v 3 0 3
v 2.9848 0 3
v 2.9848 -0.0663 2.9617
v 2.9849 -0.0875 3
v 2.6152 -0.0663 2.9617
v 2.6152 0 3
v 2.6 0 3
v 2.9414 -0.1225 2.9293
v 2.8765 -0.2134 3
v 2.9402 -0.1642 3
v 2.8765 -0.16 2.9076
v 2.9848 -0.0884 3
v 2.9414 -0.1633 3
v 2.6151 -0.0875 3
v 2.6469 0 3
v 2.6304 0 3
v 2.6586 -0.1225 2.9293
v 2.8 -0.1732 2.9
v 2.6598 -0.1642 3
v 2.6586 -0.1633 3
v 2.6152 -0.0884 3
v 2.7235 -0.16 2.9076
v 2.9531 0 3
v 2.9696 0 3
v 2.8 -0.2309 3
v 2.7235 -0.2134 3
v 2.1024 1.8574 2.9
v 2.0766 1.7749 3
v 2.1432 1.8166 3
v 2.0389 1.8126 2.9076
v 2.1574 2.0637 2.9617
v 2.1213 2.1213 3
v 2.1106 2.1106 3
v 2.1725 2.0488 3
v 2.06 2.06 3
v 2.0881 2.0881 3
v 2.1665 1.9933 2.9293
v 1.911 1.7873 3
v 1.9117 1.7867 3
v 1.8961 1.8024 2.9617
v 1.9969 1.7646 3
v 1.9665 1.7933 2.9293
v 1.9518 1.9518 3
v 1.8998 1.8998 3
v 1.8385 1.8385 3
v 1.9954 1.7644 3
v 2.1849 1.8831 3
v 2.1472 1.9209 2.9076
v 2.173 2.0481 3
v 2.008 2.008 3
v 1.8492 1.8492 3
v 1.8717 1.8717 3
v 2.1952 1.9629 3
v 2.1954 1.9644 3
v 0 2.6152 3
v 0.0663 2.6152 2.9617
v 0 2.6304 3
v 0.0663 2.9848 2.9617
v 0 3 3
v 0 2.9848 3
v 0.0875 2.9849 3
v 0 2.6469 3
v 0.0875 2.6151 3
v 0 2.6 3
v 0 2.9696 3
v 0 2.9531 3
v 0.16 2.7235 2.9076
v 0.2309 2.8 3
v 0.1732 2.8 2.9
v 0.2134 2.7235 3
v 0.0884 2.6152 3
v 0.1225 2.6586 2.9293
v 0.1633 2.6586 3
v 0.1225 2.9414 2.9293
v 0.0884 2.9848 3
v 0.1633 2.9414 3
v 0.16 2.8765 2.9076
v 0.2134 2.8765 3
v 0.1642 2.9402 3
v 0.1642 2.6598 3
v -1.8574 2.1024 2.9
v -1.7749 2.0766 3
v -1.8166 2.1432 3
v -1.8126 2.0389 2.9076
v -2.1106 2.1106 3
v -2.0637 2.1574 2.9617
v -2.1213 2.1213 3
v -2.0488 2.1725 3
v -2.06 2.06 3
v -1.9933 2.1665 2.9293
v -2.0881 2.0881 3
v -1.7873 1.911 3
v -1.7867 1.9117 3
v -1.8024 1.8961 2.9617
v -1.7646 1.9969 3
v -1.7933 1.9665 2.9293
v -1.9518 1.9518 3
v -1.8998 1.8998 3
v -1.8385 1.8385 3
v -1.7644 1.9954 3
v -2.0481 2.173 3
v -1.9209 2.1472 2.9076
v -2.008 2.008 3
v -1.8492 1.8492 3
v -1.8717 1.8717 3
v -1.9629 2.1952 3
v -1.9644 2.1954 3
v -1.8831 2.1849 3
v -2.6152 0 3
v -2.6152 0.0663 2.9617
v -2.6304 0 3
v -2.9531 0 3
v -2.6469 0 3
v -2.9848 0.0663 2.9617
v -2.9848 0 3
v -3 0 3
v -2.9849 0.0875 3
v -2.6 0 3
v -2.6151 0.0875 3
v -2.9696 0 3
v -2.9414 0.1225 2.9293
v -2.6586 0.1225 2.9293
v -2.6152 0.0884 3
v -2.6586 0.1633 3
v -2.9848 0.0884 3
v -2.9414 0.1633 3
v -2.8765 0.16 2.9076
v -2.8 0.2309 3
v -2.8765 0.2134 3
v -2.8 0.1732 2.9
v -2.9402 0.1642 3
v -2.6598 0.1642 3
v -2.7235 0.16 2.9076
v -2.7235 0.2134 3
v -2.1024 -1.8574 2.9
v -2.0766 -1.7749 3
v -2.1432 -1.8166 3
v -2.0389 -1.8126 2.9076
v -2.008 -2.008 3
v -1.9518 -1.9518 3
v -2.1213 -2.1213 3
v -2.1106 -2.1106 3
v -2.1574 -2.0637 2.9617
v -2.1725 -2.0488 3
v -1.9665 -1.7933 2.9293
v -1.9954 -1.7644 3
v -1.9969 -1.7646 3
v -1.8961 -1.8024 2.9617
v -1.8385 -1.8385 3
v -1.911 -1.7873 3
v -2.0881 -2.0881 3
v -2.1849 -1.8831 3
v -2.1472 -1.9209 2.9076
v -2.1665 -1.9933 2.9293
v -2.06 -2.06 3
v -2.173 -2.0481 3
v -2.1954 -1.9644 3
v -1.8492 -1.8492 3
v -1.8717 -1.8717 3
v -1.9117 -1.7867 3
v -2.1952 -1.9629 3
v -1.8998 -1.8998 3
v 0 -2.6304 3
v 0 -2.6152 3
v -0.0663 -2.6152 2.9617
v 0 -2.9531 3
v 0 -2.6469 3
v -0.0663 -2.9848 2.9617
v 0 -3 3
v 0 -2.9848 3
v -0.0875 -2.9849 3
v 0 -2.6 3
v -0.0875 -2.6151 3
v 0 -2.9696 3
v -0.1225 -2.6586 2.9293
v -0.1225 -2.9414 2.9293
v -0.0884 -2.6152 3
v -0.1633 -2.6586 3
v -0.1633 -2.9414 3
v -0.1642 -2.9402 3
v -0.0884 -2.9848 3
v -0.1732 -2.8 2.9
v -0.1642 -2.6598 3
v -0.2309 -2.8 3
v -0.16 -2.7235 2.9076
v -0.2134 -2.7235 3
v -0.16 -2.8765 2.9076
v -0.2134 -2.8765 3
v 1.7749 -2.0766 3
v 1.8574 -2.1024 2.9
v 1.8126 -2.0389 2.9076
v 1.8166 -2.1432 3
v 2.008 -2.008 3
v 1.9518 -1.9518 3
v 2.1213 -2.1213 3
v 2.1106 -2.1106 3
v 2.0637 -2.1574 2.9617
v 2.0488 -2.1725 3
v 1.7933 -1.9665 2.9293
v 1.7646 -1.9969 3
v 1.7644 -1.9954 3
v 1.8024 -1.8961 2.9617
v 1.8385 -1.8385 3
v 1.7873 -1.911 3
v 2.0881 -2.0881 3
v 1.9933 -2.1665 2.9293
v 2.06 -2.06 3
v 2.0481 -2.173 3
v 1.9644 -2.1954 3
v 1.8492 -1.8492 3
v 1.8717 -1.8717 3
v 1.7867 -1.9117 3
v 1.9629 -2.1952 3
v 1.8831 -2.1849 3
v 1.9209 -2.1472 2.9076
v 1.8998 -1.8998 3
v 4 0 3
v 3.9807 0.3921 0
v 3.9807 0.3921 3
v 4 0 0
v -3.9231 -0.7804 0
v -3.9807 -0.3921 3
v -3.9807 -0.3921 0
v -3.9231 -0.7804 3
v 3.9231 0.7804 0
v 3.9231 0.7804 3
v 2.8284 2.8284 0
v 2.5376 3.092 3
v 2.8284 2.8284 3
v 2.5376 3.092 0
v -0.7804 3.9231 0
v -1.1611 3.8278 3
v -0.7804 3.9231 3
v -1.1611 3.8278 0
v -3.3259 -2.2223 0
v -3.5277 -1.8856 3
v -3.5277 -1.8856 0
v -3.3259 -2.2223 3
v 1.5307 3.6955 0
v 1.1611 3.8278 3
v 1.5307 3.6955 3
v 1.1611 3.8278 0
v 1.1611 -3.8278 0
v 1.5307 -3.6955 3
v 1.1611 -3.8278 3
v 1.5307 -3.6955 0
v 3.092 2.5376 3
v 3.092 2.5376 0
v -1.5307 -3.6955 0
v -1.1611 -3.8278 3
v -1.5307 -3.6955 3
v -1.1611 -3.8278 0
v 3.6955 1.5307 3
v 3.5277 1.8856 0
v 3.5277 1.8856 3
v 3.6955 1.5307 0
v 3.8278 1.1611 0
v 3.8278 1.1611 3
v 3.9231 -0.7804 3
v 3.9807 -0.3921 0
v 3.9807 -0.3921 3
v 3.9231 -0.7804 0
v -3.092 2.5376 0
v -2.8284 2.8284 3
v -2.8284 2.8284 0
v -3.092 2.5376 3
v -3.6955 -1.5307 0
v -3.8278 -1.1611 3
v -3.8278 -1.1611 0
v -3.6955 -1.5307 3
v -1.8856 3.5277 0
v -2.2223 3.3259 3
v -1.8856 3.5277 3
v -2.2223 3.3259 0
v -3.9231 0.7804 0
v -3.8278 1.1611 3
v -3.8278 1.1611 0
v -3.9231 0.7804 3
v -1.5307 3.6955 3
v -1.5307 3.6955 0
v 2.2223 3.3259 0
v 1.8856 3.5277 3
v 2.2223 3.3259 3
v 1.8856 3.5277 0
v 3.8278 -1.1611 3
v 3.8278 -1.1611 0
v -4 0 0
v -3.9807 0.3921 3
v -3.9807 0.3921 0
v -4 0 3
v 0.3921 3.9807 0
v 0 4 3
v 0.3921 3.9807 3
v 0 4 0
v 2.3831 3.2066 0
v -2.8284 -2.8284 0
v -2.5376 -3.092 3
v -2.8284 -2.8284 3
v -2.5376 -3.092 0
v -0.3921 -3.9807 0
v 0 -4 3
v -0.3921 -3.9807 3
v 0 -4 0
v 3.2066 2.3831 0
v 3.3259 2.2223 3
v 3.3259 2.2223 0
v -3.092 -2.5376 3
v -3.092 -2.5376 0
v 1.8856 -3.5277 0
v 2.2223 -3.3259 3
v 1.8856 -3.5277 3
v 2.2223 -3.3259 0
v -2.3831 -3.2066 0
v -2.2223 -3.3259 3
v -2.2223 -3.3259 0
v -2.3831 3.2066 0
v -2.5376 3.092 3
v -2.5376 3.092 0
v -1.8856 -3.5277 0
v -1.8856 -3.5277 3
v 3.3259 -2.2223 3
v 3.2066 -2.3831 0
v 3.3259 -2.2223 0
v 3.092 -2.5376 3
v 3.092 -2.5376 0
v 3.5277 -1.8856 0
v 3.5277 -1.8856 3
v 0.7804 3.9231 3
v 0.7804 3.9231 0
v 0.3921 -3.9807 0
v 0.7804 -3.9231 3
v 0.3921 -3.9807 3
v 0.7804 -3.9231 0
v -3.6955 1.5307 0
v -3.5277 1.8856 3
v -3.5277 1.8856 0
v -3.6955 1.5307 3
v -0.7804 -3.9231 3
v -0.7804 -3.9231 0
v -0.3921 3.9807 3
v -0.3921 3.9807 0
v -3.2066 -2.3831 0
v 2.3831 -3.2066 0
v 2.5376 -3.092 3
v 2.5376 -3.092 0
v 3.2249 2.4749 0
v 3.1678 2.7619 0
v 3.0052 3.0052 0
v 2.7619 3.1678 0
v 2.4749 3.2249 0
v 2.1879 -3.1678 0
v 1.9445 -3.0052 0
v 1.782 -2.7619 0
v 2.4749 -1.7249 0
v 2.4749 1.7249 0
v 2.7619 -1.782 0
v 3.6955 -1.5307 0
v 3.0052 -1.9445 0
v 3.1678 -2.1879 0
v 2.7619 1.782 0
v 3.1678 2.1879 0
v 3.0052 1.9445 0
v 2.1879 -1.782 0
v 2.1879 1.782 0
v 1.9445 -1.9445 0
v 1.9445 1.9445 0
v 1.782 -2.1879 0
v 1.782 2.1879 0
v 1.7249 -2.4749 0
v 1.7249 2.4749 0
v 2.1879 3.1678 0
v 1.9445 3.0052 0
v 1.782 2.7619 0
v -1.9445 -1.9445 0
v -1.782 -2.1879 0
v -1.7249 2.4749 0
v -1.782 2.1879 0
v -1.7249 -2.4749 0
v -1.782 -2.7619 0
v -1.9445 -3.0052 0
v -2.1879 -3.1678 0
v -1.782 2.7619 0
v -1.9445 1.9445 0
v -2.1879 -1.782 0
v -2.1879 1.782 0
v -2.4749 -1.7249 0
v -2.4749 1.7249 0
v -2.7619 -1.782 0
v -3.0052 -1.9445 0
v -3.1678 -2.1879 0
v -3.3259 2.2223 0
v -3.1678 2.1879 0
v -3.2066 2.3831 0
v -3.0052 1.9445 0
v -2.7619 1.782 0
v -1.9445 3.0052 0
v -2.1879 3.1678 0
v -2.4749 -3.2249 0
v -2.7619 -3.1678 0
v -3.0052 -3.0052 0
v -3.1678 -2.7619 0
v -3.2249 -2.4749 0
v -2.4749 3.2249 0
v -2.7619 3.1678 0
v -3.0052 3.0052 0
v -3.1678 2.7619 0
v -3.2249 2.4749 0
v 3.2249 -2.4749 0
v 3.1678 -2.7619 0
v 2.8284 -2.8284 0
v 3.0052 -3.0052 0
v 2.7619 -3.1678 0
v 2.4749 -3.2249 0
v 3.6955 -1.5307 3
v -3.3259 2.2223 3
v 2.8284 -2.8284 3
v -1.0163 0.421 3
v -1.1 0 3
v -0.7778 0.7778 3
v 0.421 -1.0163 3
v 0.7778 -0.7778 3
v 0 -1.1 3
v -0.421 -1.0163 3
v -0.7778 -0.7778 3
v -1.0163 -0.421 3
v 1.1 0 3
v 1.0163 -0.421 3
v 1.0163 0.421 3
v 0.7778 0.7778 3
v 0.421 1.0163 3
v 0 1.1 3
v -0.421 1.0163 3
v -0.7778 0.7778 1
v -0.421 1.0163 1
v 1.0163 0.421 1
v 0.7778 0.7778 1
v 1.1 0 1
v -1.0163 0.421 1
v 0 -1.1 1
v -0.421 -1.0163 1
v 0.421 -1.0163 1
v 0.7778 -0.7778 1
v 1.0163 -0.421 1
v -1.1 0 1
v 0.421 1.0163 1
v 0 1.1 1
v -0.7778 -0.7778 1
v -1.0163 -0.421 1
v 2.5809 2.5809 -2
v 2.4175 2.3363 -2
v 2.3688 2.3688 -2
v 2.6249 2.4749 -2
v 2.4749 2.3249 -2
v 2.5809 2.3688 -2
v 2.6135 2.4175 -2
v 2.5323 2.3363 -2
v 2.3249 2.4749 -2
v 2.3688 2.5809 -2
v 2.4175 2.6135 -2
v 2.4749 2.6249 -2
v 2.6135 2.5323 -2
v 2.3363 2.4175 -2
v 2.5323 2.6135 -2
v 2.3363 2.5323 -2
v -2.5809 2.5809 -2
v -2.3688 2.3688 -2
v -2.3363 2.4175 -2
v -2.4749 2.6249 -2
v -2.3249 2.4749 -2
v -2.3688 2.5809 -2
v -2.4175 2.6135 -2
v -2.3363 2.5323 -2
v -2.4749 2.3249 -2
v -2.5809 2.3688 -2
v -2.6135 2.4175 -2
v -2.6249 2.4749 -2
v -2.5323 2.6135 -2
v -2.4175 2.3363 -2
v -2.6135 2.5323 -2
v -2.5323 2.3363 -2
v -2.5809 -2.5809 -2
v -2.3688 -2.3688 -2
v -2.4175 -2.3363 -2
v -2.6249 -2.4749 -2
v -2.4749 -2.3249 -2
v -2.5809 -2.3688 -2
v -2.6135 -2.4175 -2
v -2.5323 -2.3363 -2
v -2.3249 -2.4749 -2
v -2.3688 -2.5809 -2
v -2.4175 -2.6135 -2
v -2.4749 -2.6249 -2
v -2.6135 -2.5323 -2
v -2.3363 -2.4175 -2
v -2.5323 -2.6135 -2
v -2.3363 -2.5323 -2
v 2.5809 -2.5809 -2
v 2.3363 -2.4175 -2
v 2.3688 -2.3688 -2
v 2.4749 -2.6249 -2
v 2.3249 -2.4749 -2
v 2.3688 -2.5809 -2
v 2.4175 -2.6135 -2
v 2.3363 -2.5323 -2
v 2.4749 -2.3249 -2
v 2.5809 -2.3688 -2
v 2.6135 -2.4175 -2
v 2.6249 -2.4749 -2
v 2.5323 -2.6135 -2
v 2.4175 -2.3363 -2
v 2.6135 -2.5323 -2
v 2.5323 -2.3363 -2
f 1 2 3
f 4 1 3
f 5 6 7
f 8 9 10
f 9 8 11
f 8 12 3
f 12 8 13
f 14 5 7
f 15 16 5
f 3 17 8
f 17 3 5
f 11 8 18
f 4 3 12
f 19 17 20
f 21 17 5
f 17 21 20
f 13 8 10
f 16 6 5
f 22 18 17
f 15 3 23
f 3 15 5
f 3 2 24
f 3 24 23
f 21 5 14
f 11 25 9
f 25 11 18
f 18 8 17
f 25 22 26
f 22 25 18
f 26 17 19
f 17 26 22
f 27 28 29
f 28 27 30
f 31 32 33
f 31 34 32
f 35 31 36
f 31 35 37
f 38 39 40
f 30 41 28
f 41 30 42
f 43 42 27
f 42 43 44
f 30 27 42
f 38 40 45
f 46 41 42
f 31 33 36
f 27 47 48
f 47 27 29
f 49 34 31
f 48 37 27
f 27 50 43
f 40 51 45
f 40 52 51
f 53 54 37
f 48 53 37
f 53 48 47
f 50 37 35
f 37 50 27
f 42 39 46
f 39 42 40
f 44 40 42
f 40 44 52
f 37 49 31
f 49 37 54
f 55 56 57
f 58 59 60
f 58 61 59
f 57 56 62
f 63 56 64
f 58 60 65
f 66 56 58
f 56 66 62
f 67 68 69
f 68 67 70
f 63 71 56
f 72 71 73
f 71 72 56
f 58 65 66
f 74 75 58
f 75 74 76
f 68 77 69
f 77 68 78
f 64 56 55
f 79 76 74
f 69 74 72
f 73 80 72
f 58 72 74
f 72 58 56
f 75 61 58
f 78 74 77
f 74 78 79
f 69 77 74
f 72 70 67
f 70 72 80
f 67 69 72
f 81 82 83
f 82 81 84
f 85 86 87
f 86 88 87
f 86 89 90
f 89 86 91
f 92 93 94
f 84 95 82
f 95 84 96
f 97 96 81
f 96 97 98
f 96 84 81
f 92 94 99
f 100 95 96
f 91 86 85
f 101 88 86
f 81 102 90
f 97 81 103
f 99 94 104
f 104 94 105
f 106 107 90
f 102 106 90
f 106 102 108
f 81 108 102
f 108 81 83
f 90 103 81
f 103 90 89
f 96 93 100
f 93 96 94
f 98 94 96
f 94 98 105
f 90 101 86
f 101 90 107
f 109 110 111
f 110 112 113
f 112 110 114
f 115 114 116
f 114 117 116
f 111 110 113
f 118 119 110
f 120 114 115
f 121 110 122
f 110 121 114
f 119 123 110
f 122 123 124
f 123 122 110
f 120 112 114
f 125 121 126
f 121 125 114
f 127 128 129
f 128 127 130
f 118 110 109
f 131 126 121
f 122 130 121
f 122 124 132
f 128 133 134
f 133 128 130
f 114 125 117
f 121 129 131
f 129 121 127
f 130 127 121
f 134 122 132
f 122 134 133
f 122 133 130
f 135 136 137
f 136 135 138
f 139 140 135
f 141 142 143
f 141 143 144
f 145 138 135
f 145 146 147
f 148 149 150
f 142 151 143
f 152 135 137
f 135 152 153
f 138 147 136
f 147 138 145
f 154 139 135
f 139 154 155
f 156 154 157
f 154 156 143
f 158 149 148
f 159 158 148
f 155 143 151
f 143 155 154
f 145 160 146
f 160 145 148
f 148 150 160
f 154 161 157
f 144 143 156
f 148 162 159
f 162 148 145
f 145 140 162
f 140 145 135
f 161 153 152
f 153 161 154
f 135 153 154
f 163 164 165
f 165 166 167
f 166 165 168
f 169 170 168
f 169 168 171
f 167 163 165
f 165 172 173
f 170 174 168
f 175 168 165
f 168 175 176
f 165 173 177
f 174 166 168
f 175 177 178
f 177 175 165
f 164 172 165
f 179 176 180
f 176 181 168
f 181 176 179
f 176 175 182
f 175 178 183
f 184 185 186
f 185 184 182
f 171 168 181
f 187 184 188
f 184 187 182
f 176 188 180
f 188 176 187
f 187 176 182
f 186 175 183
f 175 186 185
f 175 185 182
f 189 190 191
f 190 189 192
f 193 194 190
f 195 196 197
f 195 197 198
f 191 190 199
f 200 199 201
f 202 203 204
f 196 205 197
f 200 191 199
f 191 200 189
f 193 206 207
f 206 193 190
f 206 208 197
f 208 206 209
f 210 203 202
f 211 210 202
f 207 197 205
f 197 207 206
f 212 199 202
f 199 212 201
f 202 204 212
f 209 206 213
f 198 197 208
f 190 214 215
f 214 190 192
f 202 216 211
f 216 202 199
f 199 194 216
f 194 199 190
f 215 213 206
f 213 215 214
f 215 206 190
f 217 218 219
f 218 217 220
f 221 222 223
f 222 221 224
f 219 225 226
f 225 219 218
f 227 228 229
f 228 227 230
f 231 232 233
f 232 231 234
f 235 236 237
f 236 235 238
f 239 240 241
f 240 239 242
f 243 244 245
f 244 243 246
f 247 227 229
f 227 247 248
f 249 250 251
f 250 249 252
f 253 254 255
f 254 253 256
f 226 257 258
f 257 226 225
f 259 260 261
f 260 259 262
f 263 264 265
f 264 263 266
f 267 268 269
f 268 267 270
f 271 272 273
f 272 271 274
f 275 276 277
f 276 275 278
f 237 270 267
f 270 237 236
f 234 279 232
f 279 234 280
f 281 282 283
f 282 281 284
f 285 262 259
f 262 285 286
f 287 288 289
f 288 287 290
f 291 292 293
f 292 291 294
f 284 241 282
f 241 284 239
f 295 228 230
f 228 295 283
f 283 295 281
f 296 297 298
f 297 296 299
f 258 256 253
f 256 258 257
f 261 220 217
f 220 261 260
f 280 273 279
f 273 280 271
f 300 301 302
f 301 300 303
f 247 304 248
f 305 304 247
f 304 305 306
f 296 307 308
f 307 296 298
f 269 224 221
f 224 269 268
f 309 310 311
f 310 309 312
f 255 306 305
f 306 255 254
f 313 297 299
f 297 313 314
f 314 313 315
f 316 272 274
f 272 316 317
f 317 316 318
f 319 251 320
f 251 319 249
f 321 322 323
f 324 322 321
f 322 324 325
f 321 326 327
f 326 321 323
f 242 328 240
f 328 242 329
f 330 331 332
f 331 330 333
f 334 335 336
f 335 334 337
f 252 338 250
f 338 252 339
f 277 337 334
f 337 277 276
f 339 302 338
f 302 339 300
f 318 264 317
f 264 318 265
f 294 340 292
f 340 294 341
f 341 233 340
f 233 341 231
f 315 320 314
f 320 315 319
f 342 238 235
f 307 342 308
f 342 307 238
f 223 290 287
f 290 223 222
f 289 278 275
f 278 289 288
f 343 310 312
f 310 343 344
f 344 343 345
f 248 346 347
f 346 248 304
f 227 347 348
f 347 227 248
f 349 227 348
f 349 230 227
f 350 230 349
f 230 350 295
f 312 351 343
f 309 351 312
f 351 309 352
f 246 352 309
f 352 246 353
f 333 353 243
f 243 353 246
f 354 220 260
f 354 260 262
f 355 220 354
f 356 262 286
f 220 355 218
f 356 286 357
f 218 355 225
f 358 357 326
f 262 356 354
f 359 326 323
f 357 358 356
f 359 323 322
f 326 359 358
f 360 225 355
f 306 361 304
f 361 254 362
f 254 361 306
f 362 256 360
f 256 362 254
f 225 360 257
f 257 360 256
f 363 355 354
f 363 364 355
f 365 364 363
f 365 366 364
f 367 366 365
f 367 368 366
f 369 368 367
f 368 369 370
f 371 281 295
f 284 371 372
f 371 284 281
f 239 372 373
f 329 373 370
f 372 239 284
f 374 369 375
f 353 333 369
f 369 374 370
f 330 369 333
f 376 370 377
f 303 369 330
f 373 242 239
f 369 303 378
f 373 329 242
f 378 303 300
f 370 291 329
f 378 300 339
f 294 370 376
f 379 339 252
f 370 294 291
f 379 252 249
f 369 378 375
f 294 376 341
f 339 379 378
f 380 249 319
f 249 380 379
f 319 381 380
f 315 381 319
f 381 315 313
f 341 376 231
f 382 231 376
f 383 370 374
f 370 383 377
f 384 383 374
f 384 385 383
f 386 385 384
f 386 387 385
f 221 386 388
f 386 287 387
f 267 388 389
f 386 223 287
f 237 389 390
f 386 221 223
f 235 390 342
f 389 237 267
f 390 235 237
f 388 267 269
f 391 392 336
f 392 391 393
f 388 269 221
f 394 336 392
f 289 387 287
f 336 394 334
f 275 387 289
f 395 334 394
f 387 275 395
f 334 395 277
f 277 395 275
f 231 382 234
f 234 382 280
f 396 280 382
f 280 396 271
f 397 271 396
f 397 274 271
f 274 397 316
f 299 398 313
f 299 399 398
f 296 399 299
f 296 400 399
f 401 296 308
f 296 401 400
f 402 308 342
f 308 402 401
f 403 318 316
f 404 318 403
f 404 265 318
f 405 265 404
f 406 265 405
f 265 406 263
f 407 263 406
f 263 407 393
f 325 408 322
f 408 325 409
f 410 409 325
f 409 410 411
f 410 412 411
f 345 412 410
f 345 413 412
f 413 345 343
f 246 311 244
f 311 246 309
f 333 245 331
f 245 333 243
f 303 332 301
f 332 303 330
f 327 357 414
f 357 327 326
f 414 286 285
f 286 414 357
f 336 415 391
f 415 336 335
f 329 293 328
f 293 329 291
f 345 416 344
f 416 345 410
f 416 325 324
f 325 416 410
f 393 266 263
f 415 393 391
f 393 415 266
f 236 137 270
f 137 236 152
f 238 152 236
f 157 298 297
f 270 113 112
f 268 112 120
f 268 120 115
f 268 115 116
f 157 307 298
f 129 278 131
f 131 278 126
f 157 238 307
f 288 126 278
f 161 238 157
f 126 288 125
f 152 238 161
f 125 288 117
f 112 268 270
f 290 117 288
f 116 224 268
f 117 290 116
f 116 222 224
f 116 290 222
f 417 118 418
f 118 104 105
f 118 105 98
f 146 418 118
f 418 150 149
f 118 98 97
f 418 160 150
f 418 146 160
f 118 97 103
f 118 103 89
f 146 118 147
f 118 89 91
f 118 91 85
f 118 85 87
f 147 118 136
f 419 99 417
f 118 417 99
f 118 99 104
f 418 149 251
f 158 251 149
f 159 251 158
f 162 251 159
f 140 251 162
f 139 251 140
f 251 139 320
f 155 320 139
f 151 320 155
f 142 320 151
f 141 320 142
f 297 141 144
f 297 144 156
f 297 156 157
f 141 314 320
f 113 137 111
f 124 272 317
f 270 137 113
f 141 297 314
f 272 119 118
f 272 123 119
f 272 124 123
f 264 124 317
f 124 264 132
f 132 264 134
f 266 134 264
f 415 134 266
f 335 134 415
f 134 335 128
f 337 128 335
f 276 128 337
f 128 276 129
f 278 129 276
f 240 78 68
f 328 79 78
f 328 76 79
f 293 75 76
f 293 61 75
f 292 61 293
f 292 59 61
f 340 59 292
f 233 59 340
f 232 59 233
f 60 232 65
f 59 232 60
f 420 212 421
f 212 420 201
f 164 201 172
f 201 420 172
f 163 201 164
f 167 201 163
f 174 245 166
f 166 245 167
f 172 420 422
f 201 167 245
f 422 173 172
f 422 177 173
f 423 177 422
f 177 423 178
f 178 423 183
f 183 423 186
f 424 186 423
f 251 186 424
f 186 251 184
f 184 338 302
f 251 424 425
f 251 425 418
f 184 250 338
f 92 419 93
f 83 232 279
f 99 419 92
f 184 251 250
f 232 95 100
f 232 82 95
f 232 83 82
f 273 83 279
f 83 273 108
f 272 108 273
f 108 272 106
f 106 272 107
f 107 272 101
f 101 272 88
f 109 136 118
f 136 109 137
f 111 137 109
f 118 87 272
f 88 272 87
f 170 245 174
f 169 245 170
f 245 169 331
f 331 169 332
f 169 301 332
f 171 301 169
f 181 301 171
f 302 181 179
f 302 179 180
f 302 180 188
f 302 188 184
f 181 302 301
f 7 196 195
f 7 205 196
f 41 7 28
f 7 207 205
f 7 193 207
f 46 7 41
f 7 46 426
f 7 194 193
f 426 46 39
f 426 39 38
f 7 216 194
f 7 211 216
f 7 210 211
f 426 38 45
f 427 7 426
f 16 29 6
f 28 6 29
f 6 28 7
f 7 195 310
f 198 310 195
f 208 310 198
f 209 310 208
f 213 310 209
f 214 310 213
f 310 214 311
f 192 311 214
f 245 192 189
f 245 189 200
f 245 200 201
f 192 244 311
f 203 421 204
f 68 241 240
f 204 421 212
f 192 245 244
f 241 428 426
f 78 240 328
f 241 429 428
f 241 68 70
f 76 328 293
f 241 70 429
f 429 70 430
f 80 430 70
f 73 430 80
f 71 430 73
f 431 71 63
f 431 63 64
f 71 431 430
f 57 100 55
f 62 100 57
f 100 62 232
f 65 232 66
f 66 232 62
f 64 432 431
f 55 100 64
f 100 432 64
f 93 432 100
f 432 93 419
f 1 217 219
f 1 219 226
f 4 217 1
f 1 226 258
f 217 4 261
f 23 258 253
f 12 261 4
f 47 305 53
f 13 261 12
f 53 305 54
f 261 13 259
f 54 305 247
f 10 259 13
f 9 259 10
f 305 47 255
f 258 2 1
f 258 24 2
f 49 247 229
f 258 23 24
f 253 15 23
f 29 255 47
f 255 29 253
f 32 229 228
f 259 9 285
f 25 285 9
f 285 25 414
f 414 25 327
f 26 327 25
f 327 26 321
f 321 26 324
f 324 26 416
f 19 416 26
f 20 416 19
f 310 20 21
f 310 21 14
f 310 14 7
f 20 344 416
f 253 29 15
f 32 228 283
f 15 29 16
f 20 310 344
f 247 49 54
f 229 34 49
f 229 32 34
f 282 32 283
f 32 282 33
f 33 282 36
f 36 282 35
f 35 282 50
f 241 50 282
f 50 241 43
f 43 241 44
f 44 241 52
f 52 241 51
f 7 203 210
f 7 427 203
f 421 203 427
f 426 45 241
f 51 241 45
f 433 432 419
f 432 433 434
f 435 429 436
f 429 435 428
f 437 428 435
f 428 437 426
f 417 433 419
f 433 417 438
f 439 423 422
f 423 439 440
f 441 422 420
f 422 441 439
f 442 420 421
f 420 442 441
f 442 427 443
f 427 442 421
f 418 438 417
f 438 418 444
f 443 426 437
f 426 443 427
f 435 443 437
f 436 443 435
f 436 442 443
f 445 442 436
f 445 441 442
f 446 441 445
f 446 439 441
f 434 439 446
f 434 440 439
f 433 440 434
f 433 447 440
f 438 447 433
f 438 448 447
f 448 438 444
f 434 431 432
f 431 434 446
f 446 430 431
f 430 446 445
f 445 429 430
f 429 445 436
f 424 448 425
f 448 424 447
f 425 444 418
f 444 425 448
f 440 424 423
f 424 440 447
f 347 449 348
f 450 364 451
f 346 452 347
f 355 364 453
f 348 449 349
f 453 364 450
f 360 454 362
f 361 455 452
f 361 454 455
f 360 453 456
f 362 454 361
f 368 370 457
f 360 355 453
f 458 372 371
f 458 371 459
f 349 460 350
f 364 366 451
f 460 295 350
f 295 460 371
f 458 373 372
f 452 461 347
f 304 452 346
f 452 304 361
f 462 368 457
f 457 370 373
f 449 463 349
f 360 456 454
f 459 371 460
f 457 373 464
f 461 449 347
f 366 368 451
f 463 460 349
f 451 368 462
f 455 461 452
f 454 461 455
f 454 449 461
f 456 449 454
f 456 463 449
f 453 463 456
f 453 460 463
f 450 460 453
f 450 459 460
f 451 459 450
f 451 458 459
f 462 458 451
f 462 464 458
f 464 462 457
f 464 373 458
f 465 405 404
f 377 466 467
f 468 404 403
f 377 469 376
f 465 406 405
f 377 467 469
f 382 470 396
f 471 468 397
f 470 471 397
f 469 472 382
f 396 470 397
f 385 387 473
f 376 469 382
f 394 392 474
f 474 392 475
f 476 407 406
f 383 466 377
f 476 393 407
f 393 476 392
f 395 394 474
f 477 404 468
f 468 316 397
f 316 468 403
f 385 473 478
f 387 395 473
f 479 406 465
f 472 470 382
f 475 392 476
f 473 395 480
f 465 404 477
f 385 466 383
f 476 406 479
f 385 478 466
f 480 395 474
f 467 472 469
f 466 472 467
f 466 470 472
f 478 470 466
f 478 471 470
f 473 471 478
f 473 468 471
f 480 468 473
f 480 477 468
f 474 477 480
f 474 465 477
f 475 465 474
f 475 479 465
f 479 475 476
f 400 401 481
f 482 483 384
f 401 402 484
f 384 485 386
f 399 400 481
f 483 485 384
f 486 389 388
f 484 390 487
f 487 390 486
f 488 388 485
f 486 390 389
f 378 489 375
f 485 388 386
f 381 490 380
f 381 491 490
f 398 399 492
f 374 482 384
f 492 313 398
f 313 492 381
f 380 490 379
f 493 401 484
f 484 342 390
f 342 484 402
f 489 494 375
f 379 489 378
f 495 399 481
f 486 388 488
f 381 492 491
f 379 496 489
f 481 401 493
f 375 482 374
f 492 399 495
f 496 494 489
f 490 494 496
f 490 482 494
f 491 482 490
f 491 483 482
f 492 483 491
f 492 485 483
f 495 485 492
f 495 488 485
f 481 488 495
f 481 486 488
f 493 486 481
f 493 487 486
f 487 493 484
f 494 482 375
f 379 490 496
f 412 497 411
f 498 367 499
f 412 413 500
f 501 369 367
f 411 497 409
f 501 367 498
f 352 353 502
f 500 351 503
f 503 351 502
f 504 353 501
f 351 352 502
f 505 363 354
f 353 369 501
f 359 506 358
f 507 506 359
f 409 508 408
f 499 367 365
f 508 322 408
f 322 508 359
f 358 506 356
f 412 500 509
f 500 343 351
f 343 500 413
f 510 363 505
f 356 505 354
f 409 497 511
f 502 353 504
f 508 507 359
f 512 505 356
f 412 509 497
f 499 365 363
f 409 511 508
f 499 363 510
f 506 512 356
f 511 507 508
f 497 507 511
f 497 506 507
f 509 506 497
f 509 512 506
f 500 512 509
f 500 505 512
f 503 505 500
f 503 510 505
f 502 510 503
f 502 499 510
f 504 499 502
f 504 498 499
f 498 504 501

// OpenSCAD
// AstraAnt Universal Grip Foot Pad (V2 -- no magnet)
// 8mm disc with 2 passive grip layers:
//   Ring: 8 spring-steel microspines (rocky surfaces)
//   Perimeter: 4 penetrator studs (loose regolith)
//
// Magnets REMOVED: metallic debris on S-type asteroids (20-25% iron)
// would accumulate and bury microspines. Rail magnetic grip handled
// by the spring-loaded rail contact brush instead.
//
// Print in PETG, press-fit spines after printing.
// Attaches to SG90 servo horn arm at leg tip.

// --- Parameters (all in mm) ---
pad_diameter = 8;
pad_thickness = 3;
pad_radius = pad_diameter / 2;

// Microspine holes (ring of 8)
spine_count = 8;
spine_hole_d = 0.4;       // 0.3mm wire + 0.1mm clearance
spine_ring_radius = 2.8;  // distance from center to spine holes
spine_angle = 30;          // inward angle from vertical
spine_depth = 3.5;         // through most of pad thickness

// Penetrator studs (perimeter, 4 at 45/135/225/315 degrees)
stud_count = 4;
stud_height = 2;
stud_base_d = 1.5;
stud_tip_d = 0.3;
stud_ring_radius = pad_radius - 0.5;

// Servo horn attachment (top)
horn_bore_d = 2.2;        // for M2 screw or servo horn shaft
horn_bore_depth = 2.0;

// --- Modules ---

module foot_pad_body() {
    // Main disc
    cylinder(d=pad_diameter, h=pad_thickness, $fn=64);
}

module spine_hole(index) {
    // Angled hole for spring-steel microspine
    angle_around = index * (360 / spine_count);
    rotate([0, 0, angle_around])
        translate([spine_ring_radius, 0, pad_thickness])
            rotate([spine_angle, 0, 0])
                cylinder(d=spine_hole_d, h=spine_depth + 1, $fn=16);
}

module spine_holes() {
    for (i = [0 : spine_count - 1]) {
        spine_hole(i);
    }
}

module penetrator_stud(index) {
    // Conical stud protruding from bottom face
    stud_angle = 45 + index * (360 / stud_count);
    rotate([0, 0, stud_angle])
        translate([stud_ring_radius, 0, 0])
            // Cone: base at pad bottom, tip extending down
            rotate([180, 0, 0])
                cylinder(d1=stud_base_d, d2=stud_tip_d,
                         h=stud_height, $fn=16);
}

module penetrator_studs() {
    for (i = [0 : stud_count - 1]) {
        penetrator_stud(i);
    }
}

module horn_attachment() {
    // Bore from top for servo horn connection
    translate([0, 0, pad_thickness - horn_bore_depth])
        cylinder(d=horn_bore_d, h=horn_bore_depth + 0.1, $fn=16);
}

// --- Assembly ---

module foot_pad() {
    union() {
        difference() {
            foot_pad_body();
            spine_holes();
            horn_attachment();
        }
        penetrator_studs();
    }
}

// Render
foot_pad();

// --- Cross-section view (uncomment to inspect internals) ---
// difference() {
//     foot_pad();
//     translate([0, -10, -5]) cube([20, 20, 20]);
// }
